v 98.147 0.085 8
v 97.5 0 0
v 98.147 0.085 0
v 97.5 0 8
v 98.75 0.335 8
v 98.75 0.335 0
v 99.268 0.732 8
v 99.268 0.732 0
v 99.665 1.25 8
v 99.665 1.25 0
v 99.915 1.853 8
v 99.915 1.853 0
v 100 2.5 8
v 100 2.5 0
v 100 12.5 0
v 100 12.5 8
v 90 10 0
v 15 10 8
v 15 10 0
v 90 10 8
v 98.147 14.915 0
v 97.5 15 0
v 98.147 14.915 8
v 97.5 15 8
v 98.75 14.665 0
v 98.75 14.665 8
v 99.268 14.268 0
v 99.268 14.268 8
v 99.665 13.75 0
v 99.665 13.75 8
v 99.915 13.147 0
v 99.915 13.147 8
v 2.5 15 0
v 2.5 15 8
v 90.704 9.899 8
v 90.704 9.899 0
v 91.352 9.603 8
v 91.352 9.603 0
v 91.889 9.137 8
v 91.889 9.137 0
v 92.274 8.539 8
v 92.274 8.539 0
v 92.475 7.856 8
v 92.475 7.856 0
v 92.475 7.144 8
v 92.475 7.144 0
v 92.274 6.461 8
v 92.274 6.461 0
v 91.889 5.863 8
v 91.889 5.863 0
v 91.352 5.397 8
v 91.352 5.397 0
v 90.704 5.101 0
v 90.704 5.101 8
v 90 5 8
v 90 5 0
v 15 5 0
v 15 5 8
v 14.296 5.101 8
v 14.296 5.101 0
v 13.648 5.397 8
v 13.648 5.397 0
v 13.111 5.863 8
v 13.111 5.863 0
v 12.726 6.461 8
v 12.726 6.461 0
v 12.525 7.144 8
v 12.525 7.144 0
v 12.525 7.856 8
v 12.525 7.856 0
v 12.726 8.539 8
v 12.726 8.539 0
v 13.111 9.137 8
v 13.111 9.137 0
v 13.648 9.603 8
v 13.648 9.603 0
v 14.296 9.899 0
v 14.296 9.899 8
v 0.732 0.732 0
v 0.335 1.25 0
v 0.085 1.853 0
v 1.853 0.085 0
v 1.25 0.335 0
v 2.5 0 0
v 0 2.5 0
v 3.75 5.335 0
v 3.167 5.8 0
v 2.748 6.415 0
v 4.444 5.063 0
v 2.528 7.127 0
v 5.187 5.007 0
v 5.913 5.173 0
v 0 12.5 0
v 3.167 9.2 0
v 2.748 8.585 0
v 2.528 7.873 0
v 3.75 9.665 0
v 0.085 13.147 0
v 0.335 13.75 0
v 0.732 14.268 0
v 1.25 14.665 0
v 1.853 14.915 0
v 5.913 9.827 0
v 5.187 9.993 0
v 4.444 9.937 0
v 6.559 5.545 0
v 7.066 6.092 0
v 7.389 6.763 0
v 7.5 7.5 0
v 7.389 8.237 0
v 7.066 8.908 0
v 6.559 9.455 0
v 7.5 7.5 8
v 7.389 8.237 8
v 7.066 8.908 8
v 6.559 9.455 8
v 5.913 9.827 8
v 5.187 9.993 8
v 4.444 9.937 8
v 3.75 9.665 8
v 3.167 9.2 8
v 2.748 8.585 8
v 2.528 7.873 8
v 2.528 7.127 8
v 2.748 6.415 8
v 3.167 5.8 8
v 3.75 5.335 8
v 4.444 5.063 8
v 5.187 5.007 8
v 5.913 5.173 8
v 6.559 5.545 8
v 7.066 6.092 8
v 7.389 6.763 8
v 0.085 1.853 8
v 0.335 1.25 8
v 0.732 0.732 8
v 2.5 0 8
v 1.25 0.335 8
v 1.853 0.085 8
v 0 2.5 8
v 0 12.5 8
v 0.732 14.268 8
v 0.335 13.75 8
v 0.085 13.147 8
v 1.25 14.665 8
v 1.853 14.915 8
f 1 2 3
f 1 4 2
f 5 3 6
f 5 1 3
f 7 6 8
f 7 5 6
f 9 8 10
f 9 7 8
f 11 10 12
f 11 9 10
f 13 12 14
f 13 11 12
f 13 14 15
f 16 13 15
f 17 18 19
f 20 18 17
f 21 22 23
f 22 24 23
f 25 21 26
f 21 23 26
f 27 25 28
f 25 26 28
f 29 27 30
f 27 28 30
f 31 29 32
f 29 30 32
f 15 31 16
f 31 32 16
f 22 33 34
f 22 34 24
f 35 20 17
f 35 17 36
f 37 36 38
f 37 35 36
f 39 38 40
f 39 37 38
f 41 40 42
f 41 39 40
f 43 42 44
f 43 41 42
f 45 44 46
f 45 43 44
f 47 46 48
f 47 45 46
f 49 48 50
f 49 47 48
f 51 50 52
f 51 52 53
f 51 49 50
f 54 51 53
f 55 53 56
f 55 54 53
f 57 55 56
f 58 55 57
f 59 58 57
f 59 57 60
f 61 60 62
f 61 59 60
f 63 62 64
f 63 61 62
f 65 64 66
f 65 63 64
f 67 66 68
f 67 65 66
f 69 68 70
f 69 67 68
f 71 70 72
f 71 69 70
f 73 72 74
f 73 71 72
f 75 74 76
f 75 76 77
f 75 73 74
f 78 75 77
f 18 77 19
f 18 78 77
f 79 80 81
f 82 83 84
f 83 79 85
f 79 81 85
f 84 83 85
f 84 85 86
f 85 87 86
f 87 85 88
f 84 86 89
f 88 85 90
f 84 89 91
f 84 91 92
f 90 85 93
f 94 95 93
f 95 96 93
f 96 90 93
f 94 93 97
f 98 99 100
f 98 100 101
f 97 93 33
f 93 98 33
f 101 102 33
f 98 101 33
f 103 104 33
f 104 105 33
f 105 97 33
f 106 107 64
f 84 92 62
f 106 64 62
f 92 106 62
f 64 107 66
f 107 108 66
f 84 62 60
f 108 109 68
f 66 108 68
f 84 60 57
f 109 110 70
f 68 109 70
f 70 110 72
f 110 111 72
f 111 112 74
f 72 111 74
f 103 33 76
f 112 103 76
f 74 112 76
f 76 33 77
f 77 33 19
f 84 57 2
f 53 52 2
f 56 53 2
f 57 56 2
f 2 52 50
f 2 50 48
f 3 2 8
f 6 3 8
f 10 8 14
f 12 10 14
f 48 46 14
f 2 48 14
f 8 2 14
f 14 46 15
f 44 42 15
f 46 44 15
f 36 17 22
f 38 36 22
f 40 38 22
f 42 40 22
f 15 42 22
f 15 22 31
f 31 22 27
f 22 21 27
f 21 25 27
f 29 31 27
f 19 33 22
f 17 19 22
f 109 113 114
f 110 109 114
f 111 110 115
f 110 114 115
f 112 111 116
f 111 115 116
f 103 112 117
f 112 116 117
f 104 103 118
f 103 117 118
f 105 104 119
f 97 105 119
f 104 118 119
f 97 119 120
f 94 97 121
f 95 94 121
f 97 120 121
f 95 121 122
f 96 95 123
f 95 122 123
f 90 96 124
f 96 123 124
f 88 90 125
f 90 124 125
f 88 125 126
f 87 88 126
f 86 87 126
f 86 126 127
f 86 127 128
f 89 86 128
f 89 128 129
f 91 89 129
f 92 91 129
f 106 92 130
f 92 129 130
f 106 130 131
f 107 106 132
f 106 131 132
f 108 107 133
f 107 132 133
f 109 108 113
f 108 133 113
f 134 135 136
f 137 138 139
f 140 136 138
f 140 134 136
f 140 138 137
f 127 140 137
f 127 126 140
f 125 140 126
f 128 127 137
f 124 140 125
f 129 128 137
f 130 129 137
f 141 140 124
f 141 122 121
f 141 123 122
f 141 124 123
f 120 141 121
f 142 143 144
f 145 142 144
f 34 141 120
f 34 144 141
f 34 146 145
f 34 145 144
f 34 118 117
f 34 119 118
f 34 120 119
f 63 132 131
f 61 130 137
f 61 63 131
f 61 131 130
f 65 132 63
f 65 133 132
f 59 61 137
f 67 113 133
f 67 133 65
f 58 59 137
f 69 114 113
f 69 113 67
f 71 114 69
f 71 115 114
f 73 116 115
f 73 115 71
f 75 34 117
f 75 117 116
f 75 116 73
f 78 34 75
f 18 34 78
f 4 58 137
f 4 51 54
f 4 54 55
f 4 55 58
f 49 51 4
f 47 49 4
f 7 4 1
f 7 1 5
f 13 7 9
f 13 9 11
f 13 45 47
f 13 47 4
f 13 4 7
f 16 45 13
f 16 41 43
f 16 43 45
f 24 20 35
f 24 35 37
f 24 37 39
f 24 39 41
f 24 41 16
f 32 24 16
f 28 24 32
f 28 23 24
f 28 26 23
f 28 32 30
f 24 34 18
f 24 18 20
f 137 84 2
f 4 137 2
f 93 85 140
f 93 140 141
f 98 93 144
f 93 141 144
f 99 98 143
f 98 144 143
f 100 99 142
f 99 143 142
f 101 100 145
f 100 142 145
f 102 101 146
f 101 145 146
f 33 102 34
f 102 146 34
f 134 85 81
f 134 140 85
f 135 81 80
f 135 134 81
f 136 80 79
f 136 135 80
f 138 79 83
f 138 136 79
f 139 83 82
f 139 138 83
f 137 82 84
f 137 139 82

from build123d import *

# Parameters (mm, degrees)
SKETCH_1_W          = 100
SKETCH_1_H          = 15
EXTRUDE_1_DEPTH     = 8
SKETCH_2_R          = 2.5
CUT_EXTRUDE_2_DEPTH = 8
FILLET_2_R          = 2.5


with BuildPart() as part:
    # Эскиз1 → Вытянуть1 (new body)
    with BuildSketch(Plane.XY):
        with Locations((50, 7.5)):
            Rectangle(SKETCH_1_W, SKETCH_1_H)
    extrude(amount=EXTRUDE_1_DEPTH)

    # Эскиз2 → Вытянуть2 (cut)
    with BuildSketch(Plane.XY.offset(8)):
        with Locations((5, 7.5)):
            Circle(SKETCH_2_R)
        with BuildLine():
            Line((15, 10), (90, 10))
            ThreePointArc((90, 10), (92.5, 7.5), (90, 5))
            Line((90, 5), (15, 5))
            ThreePointArc((15, 5), (12.5, 7.5), (15, 10))
        make_face()
    extrude(amount=-CUT_EXTRUDE_2_DEPTH, mode=Mode.SUBTRACT)

    # Скругление2
    fillet_2_edges = [part.edges().sort_by_distance(p)[0] for p in [
        (0, 15, 4),
        (100, 15, 4),
        (100, 0, 4),
        (0, 0, 4),
    ]]
    fillet(fillet_2_edges, radius=FILLET_2_R)


solid = part.part
